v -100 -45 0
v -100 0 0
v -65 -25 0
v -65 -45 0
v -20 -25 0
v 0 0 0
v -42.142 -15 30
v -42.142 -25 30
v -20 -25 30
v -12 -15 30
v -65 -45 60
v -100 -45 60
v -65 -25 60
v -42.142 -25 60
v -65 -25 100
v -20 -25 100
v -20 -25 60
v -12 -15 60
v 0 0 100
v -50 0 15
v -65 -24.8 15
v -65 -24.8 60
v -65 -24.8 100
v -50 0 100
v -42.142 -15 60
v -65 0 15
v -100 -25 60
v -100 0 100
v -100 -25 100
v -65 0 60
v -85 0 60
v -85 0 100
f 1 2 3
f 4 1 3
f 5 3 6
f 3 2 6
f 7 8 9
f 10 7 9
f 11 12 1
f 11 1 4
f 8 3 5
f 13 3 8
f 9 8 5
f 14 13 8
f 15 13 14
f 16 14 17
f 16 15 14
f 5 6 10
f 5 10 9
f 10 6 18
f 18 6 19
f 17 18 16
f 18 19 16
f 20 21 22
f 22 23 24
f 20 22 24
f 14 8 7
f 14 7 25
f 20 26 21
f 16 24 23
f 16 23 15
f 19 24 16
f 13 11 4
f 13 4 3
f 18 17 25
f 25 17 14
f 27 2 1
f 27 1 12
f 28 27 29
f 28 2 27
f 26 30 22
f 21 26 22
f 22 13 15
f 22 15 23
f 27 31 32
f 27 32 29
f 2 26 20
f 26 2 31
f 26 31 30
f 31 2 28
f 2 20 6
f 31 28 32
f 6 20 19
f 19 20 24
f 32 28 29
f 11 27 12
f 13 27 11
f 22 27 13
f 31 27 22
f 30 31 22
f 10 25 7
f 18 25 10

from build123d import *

# Parameters (mm, degrees)
F0_W      = 100
F0_H      = 100
F1_DEPTH  = 45
F2_W      = 65
F2_H      = 20
F3_DEPTH  = 100
F5_DEPTH  = 100
F7_DEPTH  = 40
F10_DEPTH = 85
F11_W     = 14.643555
F11_H     = 30
F11_W_2   = 22.142187
F12_DEPTH = 10


with BuildPart() as f1:
    # F0 (on Front) → F1 (new body)
    with BuildSketch(Plane.XZ):
        with Locations((-50, 50)):
            Rectangle(F0_W, F0_H)
    extrude(amount=F1_DEPTH)

    # F2 (on face) → F3 (cut, through all)
    with BuildSketch(Plane.XY.offset(100)):
        with Locations((-32.5, -35)):
            Rectangle(F2_W, F2_H)
    extrude(amount=-F3_DEPTH, mode=Mode.SUBTRACT)

    # F4 (on face) → F5 (cut, through all)
    with BuildSketch(Plane.XY.offset(100)):
        Polygon((0, -25), (0, 0), (-20, -25), align=None)
    extrude(amount=-F5_DEPTH, mode=Mode.SUBTRACT)

    # F2 (on face) → F7 (cut, through all)
    with BuildSketch(Plane.XY.offset(100)):
        Polygon((-65, 0), (-85, 0), (-100, -25), (-100, -45), (-65, -45), (-65, -25), align=None)
    extrude(amount=-F7_DEPTH, mode=Mode.SUBTRACT)

    # F8 (on face) → F10 (cut, through all)
    with BuildSketch(Plane.XY.offset(100)):
        Polygon((-50, 0), (-65, 0), (-65, -24.8), align=None)
    extrude(amount=-F10_DEPTH, mode=Mode.SUBTRACT)

    # F11 (on face) → F12 (cut)
    with BuildSketch(Plane.XZ.offset(25)):
        with Locations((-12.678223, 45)):
            Rectangle(F11_W, F11_H)
        with Locations((-31.071093, 45)):
            Rectangle(F11_W_2, F11_H)
    extrude(amount=-F12_DEPTH, mode=Mode.SUBTRACT)


solid = f1.part
